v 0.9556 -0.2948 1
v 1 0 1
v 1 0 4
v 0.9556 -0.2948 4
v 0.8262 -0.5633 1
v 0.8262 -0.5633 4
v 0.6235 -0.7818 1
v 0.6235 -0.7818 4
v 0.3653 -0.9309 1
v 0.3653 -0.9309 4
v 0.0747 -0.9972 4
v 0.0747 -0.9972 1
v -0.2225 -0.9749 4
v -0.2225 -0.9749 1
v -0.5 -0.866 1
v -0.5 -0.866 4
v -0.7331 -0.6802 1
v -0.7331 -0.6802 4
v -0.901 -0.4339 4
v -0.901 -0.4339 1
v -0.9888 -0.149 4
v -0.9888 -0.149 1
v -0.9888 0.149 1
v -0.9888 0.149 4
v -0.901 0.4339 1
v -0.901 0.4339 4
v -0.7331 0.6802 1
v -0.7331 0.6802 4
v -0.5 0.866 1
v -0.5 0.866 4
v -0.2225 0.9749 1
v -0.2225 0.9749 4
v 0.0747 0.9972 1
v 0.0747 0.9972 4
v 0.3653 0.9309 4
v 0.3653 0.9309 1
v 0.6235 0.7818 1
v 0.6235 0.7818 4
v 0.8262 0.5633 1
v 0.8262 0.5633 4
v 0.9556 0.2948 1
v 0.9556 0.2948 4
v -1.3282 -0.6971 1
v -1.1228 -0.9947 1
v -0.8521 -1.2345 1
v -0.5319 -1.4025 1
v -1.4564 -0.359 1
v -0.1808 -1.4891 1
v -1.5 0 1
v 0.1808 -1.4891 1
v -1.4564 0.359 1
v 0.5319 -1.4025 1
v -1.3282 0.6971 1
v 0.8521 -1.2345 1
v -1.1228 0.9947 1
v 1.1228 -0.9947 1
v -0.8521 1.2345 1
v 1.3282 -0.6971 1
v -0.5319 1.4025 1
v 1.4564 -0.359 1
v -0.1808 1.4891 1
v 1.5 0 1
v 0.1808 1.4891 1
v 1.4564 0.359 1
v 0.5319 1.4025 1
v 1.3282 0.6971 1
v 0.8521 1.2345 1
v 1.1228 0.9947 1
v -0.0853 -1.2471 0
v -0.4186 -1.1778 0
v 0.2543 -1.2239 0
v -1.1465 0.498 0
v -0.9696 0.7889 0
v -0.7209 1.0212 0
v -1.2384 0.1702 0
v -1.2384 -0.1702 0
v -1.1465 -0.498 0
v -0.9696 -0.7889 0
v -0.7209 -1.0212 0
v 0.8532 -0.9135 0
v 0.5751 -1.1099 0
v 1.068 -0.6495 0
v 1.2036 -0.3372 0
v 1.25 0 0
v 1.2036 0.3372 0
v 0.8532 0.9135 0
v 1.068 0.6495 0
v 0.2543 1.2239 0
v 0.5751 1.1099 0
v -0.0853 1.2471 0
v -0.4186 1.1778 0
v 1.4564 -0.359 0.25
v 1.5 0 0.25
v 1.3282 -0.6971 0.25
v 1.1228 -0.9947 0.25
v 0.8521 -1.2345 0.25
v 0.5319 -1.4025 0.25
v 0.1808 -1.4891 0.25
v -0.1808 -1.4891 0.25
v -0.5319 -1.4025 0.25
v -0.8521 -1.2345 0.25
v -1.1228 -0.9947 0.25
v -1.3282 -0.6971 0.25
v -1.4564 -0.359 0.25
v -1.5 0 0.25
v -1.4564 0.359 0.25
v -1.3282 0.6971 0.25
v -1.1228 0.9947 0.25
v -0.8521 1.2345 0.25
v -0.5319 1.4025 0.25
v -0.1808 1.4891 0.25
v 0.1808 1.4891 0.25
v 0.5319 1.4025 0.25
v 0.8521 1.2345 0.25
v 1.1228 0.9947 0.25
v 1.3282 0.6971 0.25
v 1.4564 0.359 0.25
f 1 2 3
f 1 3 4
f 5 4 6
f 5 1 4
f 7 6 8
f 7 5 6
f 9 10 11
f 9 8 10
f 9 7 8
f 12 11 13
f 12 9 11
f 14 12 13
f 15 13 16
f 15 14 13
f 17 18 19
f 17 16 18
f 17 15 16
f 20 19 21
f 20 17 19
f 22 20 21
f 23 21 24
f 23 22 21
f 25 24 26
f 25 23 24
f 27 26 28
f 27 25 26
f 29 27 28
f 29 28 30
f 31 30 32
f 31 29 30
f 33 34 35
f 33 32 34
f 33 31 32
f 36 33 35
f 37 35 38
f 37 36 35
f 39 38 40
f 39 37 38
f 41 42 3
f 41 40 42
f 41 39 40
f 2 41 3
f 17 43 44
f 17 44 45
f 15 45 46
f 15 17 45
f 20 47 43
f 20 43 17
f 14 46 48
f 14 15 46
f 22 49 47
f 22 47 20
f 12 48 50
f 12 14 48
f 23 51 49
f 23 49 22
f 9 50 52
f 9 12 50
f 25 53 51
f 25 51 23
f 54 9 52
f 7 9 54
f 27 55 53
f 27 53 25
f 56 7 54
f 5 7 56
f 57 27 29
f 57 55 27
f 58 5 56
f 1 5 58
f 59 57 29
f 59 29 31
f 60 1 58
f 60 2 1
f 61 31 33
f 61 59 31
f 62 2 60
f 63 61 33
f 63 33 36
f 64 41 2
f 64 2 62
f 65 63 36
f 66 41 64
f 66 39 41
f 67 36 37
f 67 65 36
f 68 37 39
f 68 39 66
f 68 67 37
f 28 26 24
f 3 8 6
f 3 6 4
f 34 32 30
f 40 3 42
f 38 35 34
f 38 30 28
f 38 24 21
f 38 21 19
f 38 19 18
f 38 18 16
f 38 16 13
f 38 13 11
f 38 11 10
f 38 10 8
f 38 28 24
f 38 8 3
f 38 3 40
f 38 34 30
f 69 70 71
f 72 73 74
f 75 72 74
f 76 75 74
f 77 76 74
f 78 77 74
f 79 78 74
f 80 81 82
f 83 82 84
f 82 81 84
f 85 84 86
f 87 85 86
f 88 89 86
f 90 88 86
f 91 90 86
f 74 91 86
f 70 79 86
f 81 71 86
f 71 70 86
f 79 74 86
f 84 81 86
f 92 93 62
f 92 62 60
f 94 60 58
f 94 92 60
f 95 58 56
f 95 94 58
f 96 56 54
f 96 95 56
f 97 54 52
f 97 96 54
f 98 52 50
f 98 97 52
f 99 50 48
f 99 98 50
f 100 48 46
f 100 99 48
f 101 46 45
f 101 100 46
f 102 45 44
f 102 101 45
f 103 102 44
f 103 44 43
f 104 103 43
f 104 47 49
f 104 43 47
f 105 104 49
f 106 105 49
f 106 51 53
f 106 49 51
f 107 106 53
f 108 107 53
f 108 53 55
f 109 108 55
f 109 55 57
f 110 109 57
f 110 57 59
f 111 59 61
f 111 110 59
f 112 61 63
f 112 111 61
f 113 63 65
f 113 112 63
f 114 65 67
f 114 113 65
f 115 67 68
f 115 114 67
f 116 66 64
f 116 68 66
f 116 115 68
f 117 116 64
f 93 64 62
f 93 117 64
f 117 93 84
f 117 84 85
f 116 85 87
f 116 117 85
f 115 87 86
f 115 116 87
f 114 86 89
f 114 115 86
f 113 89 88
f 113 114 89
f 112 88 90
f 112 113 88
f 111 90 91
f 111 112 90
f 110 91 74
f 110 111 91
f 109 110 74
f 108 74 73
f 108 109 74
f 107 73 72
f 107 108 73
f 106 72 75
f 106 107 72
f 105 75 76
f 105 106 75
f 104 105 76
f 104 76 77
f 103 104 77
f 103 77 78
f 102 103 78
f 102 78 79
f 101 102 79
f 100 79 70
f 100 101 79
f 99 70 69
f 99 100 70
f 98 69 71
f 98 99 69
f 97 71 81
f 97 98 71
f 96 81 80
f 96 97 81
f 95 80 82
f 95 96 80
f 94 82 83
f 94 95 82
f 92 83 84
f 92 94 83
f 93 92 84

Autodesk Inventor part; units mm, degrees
ref_plane "YZ Plane" through (0, 0, 0) normal (1, 0, 0) x (0, 1, 0)
ref_plane "XZ Plane" through (0, 0, 0) normal (0, 1, 0) x (-1, 0, 0)
ref_plane "XY Plane" through (0, 0, 0) normal (0, 0, 1) x (1, 0, 0)
sketch "Sketch1" plane through (0, 0, 0) normal (0, 0, 1) x (1, 0, 0)
  circle A0 centre (0, 0) radius 1.5
extrude "Extrusion1" add sketch "Sketch1" along normal blind 1
sketch "Sketch2" plane through (0, 0, 1) normal (0, 0, 1) x (1, 0, 0)
  circle A0 centre (0, 0) radius 1
extrude "Extrusion2" add sketch "Sketch2" along normal blind 3
chamfer "Chamfer1" distance 0.25 angle 45 1 edges at (-1.5, 0, 0)
thread "Thread1" size "M0.8x0.2" class "6g" standard "ANSI Metric M Profile" length 5
properties part number "Bolt" material "Steel, Carbon"
